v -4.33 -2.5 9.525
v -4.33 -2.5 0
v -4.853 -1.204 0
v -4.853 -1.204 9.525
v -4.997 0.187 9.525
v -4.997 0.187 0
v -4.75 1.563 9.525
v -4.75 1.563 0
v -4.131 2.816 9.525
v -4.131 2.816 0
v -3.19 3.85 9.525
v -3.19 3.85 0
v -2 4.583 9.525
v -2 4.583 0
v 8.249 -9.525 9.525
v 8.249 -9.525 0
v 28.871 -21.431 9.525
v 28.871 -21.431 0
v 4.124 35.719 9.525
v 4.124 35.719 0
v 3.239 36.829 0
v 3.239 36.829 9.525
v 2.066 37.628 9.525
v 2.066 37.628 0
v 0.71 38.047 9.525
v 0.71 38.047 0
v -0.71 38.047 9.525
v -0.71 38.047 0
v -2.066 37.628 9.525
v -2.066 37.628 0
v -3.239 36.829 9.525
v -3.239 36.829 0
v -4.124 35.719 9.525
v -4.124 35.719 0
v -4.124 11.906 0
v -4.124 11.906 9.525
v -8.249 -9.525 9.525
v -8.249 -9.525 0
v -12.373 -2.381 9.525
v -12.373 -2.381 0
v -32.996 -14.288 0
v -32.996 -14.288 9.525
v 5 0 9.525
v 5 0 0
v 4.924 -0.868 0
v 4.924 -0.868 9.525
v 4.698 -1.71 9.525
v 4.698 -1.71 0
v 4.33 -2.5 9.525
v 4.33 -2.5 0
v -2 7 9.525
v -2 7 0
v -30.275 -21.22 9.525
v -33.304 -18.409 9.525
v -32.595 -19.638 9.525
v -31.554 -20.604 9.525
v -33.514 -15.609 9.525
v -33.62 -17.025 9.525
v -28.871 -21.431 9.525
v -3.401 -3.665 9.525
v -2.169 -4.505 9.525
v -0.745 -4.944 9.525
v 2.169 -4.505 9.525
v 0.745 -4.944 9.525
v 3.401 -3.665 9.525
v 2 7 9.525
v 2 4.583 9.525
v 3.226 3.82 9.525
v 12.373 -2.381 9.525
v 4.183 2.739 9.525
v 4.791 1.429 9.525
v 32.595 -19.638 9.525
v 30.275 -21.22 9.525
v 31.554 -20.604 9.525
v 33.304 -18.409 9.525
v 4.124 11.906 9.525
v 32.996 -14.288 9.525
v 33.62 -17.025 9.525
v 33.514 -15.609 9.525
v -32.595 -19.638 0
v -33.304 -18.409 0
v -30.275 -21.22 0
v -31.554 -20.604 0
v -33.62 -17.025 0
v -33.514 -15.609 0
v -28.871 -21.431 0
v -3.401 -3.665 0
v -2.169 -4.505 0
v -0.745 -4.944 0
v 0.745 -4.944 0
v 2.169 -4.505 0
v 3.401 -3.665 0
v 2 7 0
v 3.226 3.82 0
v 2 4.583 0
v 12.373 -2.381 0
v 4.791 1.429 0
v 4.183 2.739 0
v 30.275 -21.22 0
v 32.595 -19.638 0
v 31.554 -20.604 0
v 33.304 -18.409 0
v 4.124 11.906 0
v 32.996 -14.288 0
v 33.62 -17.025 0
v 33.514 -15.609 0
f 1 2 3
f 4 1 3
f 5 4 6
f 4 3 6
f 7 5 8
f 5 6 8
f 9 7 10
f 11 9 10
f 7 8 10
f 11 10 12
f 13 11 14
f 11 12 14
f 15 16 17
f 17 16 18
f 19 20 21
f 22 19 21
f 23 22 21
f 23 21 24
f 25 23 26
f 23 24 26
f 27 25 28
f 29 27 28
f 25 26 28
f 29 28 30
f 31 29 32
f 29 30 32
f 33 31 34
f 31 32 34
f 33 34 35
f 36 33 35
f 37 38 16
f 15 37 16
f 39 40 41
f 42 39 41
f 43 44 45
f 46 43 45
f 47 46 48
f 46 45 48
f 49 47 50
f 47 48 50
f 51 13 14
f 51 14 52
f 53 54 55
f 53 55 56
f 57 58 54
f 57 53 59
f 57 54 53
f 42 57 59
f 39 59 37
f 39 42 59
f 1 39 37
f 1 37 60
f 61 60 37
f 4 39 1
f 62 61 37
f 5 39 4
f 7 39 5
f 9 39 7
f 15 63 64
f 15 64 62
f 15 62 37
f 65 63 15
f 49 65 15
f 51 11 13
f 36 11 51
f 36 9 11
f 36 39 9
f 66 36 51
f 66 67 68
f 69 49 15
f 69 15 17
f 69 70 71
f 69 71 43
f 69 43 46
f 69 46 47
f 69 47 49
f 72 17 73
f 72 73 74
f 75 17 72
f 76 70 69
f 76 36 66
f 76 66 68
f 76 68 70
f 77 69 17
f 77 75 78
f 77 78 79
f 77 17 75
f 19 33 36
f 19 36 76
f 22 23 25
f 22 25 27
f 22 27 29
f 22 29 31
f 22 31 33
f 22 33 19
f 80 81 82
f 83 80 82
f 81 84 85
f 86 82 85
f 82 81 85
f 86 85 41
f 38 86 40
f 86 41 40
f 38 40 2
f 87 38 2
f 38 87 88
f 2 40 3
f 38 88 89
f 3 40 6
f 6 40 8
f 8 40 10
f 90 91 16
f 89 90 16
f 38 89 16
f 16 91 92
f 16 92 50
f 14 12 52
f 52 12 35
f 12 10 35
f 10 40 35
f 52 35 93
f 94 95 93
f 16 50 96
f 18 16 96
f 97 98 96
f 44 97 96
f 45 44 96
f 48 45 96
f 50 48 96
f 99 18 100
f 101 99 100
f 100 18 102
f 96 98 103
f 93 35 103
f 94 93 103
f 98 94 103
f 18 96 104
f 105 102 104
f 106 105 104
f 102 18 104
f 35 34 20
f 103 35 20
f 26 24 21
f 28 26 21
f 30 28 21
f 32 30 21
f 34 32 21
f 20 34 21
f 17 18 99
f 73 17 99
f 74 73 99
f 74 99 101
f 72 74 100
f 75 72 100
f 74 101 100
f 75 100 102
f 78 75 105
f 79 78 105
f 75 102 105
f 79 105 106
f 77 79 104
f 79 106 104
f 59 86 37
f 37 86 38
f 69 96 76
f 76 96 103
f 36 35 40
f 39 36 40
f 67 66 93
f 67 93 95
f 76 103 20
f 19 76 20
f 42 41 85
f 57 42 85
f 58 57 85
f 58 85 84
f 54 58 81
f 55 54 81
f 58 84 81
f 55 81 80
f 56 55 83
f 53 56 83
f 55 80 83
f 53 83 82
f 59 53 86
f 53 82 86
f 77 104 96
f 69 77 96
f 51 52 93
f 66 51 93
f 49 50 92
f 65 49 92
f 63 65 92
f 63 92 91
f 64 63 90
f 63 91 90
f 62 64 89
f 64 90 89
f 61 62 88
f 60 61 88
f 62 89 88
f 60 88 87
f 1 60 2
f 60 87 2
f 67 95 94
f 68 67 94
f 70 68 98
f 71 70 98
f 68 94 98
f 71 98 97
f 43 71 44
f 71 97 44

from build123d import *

# Parameters (mm, degrees)
F2_DEPTH = 9.525


# Not quite as in the source:
# - a variable given as a bare number and used for a length is read in inches; the dataset says mm whatever the document's units were


with BuildPart() as f2:
    # F1 (on Top) → F2 (new body)
    with BuildSketch(Plane.XY):
        with BuildLine():
            Line((4.1244459855, 11.90625), (4.1244459855, 35.71875))
            ThreePointArc((4.1244459855, 35.71875), (0, 38.1), (-4.1244459855, 35.71875))
            Line((-4.1244459855, 35.71875), (-4.1244459855, 11.90625))
            Line((-4.1244459855, 11.90625), (0, 19.05))
            Line((0, 19.05), (4.1244459855, 11.90625))
        make_face()
        with BuildLine():
            Line((4.1244459855, 7.14375), (4.1244459855, 11.90625))
            Line((4.1244459855, 11.90625), (0, 19.05))
            Line((0, 19.05), (0, 7))
            Line((0, 7), (2, 7))
            Line((2, 7), (2, 4.582575695))
            ThreePointArc((2, 4.582575695), (4.1833001327, 2.7386127875), (5, 0))
            ThreePointArc((5, 0), (4.8296291314, -1.2940952255), (4.3301270189, -2.5))
            Line((4.3301270189, -2.5), (16.4977839421, -9.525))
            Line((16.4977839421, -9.525), (12.3733379566, -2.38125))
            Line((12.3733379566, -2.38125), (8.248891971, 0))
            Line((8.248891971, 0), (4.1244459855, 7.14375))
        make_face()
        with BuildLine():
            Line((0, 19.05), (-4.1244459855, 11.90625))
            Line((-4.1244459855, 11.90625), (-4.1244459855, 7.14375))
            Line((-4.1244459855, 7.14375), (-8.248891971, 0))
            Line((-8.248891971, 0), (-12.3733379566, -2.38125))
            Line((-12.3733379566, -2.38125), (-16.4977839421, -9.525))
            Line((-16.4977839421, -9.525), (-4.3301270189, -2.5))
            ThreePointArc((-4.3301270189, -2.5), (-4.7495627838, 1.562579074), (-2, 4.582575695))
            Line((-2, 4.582575695), (-2, 7))
            Line((-2, 7), (0, 7))
            Line((0, 7), (0, 19.05))
        make_face()
        with BuildLine():
            Line((4.1244459855, -7.14375), (8.248891971, -9.525))
            Line((8.248891971, -9.525), (16.4977839421, -9.525))
            Line((16.4977839421, -9.525), (4.3301270189, -2.5))
            ThreePointArc((4.3301270189, -2.5), (0, -5), (-4.3301270189, -2.5))
            Line((-4.3301270189, -2.5), (-16.4977839421, -9.525))
            Line((-16.4977839421, -9.525), (-8.248891971, -9.525))
            Line((-8.248891971, -9.525), (-4.1244459855, -7.14375))
            Line((-4.1244459855, -7.14375), (4.1244459855, -7.14375))
        make_face()
        with BuildLine():
            ThreePointArc((28.8711218987, -21.43125), (32.9955678842, -19.05), (32.9955678842, -14.2875))
            Line((32.9955678842, -14.2875), (12.3733379566, -2.38125))
            Line((12.3733379566, -2.38125), (16.4977839421, -9.525))
            Line((16.4977839421, -9.525), (8.248891971, -9.525))
            Line((8.248891971, -9.525), (28.8711218987, -21.43125))
        make_face()
        with BuildLine():
            Line((-12.3733379566, -2.38125), (-32.9955678842, -14.2875))
            ThreePointArc((-32.9955678842, -14.2875), (-32.9955678842, -19.05), (-28.8711218987, -21.43125))
            Line((-28.8711218987, -21.43125), (-8.248891971, -9.525))
            Line((-8.248891971, -9.525), (-16.4977839421, -9.525))
            Line((-16.4977839421, -9.525), (-12.3733379566, -2.38125))
        make_face()
        Polygon((-8.248891971, -9.525), (8.248891971, -9.525), (4.1244459855, -7.14375), (-4.1244459855, -7.14375), align=None)
        Polygon((12.3733379566, -2.38125), (4.1244459855, 11.90625), (4.1244459855, 7.14375), (8.248891971, 0), align=None)
        Polygon((-4.1244459855, 7.14375), (-4.1244459855, 11.90625), (-12.3733379566, -2.38125), (-8.248891971, 0), align=None)
    extrude(amount=F2_DEPTH)


solid = f2.part
